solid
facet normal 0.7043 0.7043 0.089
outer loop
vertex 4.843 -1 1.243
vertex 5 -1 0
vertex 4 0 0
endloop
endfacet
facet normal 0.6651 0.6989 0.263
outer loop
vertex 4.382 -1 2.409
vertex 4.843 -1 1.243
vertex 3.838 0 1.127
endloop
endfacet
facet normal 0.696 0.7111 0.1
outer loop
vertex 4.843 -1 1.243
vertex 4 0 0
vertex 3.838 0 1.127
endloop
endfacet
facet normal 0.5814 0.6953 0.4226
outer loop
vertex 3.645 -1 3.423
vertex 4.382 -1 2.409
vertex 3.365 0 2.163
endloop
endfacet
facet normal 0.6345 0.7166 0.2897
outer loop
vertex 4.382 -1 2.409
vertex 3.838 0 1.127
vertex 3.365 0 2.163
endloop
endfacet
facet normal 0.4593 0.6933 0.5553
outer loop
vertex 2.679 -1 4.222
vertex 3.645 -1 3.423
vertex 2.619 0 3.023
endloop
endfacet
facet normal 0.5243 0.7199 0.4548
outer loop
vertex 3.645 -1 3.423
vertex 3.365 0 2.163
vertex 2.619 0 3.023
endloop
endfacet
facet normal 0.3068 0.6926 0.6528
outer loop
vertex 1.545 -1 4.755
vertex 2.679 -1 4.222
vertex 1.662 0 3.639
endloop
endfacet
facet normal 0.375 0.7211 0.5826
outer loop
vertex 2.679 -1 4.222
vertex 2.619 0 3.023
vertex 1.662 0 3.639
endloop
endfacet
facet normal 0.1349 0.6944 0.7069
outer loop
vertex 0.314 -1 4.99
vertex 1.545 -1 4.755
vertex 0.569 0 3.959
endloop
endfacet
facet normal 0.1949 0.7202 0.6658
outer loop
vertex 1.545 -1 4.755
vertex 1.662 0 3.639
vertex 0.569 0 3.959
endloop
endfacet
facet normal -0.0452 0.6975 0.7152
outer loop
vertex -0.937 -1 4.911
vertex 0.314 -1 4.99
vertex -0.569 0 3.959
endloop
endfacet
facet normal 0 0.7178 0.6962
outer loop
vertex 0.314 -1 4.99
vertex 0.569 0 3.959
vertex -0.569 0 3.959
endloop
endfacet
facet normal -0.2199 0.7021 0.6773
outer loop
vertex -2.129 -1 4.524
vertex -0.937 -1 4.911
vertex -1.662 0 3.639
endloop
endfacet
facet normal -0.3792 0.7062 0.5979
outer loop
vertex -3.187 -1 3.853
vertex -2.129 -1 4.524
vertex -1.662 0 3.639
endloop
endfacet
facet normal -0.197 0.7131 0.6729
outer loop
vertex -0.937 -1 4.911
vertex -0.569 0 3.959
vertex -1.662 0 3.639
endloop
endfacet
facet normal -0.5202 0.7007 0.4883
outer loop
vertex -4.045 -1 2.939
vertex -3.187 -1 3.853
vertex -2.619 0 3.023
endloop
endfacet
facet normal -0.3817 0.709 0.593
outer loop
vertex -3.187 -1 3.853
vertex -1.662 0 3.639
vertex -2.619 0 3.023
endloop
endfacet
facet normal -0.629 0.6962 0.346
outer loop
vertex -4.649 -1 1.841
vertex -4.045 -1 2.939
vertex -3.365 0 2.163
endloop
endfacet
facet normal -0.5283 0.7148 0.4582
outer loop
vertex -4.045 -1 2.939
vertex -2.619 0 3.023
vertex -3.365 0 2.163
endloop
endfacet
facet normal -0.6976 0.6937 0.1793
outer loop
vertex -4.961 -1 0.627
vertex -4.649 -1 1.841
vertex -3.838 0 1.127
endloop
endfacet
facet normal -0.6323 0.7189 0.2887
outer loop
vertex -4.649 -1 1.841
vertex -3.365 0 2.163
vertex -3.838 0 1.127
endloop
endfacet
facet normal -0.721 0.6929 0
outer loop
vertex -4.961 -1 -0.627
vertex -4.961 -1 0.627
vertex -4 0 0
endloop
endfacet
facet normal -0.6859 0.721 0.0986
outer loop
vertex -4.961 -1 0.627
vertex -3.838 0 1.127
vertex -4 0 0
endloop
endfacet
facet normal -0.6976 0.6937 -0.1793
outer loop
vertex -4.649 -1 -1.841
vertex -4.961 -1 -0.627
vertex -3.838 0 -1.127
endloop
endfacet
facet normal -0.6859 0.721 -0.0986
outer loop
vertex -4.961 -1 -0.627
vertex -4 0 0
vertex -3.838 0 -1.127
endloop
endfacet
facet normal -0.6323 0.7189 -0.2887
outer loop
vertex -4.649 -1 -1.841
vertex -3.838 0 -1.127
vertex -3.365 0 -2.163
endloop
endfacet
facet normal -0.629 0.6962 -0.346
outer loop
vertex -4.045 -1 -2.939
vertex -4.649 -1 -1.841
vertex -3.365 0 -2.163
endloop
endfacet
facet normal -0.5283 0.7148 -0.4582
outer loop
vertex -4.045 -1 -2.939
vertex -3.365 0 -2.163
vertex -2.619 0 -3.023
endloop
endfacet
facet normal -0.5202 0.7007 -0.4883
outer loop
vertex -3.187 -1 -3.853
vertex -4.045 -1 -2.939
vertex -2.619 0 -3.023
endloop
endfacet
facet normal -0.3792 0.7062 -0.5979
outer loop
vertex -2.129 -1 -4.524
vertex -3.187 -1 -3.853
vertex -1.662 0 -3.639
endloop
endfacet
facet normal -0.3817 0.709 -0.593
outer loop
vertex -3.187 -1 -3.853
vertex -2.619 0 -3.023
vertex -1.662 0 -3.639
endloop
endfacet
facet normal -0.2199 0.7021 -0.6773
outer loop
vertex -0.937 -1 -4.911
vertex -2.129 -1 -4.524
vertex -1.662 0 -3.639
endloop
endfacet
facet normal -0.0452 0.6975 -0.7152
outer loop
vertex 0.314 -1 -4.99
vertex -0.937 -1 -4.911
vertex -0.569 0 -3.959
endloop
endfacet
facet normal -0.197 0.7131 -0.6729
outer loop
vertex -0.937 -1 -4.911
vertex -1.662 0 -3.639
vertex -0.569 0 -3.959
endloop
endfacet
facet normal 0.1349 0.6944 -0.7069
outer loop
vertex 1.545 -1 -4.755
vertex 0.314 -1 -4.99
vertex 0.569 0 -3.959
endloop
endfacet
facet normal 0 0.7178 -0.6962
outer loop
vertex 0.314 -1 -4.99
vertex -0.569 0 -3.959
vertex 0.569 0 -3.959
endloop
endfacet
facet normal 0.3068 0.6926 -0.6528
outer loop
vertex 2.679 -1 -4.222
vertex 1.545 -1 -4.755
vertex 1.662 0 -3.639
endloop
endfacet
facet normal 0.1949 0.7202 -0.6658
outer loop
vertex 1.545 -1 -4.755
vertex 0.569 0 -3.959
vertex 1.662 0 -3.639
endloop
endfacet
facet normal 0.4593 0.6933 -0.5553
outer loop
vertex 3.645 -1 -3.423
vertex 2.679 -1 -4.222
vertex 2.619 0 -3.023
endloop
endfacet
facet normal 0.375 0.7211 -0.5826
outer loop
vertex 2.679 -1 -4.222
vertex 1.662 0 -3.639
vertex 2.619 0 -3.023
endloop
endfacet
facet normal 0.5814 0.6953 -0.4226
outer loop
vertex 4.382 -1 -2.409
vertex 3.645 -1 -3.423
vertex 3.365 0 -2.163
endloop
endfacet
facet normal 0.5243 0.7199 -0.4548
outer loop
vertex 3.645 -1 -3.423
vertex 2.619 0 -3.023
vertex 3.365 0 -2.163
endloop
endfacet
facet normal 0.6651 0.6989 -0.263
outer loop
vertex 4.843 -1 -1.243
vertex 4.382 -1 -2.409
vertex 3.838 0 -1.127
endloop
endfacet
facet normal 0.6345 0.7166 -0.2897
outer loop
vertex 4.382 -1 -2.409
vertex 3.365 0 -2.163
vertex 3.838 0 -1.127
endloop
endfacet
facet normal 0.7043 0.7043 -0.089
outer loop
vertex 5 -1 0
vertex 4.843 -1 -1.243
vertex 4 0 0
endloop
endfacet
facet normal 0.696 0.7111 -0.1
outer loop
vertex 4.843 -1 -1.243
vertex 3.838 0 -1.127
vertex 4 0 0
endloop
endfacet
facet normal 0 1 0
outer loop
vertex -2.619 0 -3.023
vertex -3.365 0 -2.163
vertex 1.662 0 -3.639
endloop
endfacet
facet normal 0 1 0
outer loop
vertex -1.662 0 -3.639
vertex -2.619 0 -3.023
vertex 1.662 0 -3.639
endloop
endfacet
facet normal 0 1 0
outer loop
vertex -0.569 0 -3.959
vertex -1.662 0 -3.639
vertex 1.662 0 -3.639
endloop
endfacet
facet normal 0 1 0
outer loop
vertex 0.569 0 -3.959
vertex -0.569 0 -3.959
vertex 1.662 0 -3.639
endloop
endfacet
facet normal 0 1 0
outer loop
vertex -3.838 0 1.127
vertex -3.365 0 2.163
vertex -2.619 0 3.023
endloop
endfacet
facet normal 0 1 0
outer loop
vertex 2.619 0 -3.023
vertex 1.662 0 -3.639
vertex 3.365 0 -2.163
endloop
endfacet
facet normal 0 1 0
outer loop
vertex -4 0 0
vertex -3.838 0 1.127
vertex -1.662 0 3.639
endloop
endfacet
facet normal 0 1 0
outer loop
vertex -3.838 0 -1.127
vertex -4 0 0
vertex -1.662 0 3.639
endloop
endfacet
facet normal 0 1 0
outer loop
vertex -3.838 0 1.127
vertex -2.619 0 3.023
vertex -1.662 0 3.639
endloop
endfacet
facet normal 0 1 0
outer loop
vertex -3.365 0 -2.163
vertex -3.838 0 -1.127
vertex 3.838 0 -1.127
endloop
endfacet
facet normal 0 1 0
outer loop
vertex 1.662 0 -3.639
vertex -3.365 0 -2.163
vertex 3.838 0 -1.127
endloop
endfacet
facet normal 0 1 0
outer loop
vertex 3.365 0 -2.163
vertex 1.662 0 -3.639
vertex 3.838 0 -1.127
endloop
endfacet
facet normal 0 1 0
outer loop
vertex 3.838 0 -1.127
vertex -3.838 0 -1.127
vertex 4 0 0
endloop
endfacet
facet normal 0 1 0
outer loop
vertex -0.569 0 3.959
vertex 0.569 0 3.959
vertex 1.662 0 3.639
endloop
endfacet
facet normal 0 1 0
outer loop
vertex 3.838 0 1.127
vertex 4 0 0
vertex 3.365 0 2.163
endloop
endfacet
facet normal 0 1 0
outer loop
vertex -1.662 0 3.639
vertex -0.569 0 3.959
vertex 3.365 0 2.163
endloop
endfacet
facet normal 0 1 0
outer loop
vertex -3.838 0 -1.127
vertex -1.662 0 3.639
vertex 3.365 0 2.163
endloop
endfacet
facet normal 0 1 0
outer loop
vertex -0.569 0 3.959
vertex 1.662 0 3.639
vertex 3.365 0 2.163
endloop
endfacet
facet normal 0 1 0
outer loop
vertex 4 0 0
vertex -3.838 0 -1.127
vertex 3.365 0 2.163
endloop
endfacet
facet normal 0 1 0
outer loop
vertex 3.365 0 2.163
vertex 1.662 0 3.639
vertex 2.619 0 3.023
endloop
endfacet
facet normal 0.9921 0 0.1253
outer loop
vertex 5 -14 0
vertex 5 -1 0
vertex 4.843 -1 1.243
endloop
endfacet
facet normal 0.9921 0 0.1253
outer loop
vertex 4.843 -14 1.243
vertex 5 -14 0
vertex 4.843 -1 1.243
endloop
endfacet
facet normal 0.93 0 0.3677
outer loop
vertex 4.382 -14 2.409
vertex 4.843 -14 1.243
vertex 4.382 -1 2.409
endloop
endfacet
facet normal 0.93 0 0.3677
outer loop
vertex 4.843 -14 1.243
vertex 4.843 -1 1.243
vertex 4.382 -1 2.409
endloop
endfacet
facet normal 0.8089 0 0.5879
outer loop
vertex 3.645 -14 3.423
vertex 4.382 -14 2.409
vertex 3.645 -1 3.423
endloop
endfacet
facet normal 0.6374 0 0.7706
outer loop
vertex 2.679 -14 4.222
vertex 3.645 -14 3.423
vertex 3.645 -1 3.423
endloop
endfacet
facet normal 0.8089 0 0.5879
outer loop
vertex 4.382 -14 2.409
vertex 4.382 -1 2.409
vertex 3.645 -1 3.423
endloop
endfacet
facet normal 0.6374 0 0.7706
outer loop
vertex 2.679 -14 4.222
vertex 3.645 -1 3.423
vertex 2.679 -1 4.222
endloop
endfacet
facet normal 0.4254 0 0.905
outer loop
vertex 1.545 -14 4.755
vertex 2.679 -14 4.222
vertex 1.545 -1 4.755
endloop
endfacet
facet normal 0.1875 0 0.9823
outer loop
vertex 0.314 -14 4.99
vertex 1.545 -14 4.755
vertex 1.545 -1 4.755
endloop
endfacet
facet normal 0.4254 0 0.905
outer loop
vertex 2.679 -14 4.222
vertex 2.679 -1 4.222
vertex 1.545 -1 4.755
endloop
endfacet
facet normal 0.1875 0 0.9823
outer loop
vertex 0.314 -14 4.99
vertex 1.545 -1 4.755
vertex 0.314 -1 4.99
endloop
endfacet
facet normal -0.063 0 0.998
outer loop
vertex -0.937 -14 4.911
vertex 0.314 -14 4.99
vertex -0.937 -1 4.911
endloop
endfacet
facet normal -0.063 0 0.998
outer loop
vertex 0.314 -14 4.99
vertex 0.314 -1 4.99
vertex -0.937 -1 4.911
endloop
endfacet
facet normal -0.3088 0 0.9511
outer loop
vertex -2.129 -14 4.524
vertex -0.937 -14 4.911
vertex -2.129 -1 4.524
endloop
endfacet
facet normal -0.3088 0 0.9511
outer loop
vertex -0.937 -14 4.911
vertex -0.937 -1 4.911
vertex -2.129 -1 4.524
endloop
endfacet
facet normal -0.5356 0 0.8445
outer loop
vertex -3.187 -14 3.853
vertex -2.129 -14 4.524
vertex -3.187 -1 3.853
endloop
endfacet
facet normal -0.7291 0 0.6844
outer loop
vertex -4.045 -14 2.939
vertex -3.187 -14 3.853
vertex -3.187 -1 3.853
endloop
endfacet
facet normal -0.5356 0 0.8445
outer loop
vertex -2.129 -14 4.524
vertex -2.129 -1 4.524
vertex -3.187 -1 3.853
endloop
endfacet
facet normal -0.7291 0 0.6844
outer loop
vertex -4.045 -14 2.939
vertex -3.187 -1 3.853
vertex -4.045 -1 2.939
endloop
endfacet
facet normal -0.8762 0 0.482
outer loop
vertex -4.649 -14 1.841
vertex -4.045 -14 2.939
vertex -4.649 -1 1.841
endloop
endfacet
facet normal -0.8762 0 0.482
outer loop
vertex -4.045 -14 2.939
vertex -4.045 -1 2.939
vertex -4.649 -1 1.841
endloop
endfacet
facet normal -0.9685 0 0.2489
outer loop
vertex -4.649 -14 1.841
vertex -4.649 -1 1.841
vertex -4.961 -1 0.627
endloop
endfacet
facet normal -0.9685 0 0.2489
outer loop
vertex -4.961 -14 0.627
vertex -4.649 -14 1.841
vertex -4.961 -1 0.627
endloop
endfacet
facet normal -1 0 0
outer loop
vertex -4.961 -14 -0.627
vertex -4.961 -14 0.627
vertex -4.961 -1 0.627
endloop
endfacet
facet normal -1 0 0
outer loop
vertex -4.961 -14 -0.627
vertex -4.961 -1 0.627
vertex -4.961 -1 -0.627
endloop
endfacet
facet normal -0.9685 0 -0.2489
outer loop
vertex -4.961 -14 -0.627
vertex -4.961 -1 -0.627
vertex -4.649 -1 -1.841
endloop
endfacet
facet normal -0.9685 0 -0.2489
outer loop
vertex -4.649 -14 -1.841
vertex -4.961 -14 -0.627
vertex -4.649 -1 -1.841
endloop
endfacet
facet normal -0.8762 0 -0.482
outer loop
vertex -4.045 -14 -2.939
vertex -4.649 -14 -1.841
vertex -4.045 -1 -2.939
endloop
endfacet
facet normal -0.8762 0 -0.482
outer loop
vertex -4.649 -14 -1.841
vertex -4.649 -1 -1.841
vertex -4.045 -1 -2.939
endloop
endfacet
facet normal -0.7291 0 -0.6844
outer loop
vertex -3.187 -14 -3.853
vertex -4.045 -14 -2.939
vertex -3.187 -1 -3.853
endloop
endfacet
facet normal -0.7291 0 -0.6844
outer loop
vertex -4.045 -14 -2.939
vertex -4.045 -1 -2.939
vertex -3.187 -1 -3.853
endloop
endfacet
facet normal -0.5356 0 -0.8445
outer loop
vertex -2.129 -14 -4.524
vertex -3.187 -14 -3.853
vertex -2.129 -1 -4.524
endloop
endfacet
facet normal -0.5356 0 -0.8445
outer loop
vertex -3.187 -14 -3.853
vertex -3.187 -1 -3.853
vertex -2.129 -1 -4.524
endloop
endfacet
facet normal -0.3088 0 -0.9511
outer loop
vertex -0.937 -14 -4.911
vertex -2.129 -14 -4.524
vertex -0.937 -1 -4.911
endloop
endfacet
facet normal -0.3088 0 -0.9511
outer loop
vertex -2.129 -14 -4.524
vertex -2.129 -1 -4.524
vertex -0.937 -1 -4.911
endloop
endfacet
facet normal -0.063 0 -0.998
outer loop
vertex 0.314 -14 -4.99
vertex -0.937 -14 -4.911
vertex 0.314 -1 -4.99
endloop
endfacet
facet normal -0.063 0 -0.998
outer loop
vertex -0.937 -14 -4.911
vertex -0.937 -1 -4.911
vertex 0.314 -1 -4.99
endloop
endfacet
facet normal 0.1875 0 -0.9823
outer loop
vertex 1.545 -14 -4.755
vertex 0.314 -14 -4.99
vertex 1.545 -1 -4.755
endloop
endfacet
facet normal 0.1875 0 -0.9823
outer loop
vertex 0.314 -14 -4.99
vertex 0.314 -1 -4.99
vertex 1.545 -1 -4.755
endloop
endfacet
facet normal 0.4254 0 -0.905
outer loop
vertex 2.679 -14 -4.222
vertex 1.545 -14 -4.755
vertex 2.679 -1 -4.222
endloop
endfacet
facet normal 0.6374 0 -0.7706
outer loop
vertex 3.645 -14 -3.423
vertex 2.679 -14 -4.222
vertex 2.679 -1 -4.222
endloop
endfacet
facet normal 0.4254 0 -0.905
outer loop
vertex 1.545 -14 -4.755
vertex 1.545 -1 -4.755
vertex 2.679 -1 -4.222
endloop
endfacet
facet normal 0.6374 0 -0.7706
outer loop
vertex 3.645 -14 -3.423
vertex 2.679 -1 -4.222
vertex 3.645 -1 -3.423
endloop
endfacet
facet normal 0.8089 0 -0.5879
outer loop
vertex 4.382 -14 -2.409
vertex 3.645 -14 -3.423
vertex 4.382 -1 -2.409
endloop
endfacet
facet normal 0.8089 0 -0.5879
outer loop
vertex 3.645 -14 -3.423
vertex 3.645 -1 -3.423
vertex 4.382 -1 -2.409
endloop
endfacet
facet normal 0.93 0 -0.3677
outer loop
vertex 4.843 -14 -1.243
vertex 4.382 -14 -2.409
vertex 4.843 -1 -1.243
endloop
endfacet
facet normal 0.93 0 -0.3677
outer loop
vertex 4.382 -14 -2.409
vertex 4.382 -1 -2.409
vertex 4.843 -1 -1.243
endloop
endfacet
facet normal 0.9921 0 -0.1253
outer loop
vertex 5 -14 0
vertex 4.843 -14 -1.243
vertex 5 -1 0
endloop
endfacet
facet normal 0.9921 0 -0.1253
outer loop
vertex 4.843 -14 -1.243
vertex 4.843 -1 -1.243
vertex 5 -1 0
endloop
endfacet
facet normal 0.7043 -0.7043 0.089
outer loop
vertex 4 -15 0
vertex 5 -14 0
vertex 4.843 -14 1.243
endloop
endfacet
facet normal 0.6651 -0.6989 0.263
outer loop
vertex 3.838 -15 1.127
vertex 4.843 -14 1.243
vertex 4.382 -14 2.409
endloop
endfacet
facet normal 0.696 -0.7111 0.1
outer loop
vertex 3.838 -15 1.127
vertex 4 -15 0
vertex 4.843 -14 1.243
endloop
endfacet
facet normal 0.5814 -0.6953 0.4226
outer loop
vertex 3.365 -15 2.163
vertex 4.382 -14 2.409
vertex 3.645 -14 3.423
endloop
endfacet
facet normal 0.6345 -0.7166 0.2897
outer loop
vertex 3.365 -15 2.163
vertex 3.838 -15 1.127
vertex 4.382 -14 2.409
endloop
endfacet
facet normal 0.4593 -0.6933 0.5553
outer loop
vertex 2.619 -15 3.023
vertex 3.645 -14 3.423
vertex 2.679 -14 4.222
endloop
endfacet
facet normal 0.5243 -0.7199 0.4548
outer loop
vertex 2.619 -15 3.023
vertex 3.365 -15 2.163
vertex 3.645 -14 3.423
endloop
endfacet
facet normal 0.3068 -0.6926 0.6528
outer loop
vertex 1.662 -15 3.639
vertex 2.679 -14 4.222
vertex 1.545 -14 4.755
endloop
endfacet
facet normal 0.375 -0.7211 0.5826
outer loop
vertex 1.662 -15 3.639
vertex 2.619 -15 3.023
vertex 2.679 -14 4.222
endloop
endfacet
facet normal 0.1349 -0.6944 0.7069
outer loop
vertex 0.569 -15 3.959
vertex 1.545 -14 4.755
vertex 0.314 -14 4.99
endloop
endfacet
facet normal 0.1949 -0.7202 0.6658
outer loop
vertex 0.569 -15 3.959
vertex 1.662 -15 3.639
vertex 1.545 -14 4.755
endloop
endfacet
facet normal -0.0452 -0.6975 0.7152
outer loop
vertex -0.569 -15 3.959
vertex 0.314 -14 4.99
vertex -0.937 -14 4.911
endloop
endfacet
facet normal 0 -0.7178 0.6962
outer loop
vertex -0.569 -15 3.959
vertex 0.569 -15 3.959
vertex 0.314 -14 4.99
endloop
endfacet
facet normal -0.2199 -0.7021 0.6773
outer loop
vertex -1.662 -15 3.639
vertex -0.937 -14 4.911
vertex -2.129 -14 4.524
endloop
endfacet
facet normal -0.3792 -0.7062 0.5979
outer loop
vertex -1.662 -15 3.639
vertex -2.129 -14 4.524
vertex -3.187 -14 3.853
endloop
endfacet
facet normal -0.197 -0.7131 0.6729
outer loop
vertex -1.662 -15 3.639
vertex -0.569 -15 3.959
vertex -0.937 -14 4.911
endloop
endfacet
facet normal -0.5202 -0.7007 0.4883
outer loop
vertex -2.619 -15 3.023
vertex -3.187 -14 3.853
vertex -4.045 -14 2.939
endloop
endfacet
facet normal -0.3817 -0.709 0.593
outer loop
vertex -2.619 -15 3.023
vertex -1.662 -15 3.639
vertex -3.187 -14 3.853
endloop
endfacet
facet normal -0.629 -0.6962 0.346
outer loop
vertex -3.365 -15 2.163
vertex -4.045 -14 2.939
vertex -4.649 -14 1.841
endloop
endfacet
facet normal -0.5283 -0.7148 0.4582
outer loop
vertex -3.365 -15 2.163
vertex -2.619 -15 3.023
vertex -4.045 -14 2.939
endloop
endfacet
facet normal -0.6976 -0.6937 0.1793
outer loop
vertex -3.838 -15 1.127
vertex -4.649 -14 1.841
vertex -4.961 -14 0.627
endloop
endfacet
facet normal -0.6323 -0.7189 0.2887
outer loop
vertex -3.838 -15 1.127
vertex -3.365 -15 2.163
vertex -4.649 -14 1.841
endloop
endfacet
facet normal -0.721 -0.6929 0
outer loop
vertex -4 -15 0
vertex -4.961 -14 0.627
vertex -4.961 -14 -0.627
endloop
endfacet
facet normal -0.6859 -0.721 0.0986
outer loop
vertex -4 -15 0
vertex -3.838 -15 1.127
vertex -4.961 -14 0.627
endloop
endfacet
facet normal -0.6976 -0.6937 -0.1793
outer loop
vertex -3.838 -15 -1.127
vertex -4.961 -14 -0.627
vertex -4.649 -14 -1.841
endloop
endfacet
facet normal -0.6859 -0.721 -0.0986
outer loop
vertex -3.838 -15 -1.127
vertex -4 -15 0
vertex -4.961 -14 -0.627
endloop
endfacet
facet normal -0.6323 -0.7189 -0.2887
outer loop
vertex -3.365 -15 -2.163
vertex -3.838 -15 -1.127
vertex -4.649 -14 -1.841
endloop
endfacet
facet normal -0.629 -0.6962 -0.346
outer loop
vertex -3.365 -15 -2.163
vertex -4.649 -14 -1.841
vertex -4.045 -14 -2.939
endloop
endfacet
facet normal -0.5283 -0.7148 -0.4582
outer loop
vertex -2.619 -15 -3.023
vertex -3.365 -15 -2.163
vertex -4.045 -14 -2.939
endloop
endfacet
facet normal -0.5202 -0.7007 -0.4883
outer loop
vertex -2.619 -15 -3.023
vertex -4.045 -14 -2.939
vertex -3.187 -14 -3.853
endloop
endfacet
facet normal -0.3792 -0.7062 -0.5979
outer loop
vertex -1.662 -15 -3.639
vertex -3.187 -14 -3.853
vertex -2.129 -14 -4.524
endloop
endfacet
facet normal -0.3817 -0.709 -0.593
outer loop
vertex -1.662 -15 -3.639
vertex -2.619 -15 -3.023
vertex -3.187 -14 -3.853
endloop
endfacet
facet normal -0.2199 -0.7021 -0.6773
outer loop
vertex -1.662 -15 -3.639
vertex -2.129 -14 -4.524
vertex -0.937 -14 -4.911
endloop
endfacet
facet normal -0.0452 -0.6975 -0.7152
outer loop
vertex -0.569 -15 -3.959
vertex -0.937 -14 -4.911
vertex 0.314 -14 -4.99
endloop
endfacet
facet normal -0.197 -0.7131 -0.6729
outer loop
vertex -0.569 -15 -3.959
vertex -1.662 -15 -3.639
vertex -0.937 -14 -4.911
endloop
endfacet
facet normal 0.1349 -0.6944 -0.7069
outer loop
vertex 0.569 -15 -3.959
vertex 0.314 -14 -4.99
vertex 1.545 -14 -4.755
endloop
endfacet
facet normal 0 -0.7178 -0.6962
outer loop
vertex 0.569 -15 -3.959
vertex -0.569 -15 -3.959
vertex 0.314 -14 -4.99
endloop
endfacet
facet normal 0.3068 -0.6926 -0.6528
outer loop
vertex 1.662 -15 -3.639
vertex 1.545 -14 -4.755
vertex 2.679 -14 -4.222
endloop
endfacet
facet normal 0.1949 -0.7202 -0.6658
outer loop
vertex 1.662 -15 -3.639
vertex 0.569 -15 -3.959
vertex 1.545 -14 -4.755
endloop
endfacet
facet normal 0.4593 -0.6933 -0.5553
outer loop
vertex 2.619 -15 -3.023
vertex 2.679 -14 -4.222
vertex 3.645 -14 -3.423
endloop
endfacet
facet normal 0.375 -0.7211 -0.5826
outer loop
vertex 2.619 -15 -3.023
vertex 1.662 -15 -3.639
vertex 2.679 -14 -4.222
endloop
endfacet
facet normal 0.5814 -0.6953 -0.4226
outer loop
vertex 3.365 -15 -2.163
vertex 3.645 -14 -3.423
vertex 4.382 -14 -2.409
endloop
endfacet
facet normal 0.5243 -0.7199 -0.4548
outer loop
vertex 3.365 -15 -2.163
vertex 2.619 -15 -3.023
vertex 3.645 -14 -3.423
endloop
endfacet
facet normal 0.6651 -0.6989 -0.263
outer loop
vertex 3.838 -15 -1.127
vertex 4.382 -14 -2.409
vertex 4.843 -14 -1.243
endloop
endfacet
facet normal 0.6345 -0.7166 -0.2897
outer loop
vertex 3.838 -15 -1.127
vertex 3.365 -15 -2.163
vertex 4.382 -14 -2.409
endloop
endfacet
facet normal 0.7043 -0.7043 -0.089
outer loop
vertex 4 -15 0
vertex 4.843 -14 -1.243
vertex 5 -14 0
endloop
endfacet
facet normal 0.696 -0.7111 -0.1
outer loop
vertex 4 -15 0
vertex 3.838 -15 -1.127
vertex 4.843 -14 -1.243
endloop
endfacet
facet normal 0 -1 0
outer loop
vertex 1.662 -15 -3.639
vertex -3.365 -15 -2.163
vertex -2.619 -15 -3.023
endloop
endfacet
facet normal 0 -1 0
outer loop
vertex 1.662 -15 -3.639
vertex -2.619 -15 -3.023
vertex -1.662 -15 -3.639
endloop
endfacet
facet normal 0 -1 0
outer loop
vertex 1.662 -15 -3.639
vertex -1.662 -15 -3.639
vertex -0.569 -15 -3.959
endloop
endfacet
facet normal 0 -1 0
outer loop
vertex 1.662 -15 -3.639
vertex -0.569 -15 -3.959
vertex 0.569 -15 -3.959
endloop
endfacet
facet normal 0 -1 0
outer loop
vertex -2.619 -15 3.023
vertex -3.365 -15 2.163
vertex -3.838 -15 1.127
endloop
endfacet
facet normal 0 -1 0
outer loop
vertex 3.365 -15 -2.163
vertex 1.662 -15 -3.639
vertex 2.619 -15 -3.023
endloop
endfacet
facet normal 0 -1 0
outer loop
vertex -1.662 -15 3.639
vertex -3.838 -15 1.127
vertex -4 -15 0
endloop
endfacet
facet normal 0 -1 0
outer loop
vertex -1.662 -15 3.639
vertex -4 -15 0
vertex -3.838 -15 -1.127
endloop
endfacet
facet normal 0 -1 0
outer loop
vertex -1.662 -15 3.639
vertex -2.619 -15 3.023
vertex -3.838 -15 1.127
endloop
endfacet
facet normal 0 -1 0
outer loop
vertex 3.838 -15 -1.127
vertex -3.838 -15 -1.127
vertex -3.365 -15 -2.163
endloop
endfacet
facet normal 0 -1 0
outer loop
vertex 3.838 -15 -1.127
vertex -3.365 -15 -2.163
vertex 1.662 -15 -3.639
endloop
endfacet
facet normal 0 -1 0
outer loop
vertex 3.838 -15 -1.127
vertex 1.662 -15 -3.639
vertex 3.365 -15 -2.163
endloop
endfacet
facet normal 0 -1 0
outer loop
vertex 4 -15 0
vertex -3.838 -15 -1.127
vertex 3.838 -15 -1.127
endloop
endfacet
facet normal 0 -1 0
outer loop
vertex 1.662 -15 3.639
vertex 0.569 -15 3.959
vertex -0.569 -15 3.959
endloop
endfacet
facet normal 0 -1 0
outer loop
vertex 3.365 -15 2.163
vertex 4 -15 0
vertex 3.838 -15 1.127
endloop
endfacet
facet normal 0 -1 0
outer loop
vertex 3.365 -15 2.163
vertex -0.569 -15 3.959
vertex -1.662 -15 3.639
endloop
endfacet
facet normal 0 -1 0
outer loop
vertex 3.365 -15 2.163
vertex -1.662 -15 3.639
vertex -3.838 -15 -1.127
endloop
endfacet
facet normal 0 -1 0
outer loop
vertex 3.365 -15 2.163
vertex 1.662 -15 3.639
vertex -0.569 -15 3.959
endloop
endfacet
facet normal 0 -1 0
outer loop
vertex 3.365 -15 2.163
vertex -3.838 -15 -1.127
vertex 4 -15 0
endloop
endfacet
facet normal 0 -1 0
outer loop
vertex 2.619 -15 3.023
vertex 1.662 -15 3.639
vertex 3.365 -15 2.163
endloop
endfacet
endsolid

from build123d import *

# Parameters (mm, degrees)
F0_R     = 5
F1_DEPTH = 15
F2_SIZE  = 1
F3_SIZE  = 1


with BuildPart() as f1:
    # F0 (on Front) → F1 (new body)
    with BuildSketch(Plane.XZ):
        Circle(F0_R)
    extrude(amount=F1_DEPTH)

    # F2
    f2_edges = [f1.edges().sort_by_distance(p)[0] for p in [
        (-5, 0, 0),
    ]]
    chamfer(f2_edges, length=F2_SIZE)

    # F3
    f3_edges = [f1.edges().sort_by_distance(p)[0] for p in [
        (-5, -15, 0),
    ]]
    chamfer(f3_edges, length=F3_SIZE)


solid = f1.part
